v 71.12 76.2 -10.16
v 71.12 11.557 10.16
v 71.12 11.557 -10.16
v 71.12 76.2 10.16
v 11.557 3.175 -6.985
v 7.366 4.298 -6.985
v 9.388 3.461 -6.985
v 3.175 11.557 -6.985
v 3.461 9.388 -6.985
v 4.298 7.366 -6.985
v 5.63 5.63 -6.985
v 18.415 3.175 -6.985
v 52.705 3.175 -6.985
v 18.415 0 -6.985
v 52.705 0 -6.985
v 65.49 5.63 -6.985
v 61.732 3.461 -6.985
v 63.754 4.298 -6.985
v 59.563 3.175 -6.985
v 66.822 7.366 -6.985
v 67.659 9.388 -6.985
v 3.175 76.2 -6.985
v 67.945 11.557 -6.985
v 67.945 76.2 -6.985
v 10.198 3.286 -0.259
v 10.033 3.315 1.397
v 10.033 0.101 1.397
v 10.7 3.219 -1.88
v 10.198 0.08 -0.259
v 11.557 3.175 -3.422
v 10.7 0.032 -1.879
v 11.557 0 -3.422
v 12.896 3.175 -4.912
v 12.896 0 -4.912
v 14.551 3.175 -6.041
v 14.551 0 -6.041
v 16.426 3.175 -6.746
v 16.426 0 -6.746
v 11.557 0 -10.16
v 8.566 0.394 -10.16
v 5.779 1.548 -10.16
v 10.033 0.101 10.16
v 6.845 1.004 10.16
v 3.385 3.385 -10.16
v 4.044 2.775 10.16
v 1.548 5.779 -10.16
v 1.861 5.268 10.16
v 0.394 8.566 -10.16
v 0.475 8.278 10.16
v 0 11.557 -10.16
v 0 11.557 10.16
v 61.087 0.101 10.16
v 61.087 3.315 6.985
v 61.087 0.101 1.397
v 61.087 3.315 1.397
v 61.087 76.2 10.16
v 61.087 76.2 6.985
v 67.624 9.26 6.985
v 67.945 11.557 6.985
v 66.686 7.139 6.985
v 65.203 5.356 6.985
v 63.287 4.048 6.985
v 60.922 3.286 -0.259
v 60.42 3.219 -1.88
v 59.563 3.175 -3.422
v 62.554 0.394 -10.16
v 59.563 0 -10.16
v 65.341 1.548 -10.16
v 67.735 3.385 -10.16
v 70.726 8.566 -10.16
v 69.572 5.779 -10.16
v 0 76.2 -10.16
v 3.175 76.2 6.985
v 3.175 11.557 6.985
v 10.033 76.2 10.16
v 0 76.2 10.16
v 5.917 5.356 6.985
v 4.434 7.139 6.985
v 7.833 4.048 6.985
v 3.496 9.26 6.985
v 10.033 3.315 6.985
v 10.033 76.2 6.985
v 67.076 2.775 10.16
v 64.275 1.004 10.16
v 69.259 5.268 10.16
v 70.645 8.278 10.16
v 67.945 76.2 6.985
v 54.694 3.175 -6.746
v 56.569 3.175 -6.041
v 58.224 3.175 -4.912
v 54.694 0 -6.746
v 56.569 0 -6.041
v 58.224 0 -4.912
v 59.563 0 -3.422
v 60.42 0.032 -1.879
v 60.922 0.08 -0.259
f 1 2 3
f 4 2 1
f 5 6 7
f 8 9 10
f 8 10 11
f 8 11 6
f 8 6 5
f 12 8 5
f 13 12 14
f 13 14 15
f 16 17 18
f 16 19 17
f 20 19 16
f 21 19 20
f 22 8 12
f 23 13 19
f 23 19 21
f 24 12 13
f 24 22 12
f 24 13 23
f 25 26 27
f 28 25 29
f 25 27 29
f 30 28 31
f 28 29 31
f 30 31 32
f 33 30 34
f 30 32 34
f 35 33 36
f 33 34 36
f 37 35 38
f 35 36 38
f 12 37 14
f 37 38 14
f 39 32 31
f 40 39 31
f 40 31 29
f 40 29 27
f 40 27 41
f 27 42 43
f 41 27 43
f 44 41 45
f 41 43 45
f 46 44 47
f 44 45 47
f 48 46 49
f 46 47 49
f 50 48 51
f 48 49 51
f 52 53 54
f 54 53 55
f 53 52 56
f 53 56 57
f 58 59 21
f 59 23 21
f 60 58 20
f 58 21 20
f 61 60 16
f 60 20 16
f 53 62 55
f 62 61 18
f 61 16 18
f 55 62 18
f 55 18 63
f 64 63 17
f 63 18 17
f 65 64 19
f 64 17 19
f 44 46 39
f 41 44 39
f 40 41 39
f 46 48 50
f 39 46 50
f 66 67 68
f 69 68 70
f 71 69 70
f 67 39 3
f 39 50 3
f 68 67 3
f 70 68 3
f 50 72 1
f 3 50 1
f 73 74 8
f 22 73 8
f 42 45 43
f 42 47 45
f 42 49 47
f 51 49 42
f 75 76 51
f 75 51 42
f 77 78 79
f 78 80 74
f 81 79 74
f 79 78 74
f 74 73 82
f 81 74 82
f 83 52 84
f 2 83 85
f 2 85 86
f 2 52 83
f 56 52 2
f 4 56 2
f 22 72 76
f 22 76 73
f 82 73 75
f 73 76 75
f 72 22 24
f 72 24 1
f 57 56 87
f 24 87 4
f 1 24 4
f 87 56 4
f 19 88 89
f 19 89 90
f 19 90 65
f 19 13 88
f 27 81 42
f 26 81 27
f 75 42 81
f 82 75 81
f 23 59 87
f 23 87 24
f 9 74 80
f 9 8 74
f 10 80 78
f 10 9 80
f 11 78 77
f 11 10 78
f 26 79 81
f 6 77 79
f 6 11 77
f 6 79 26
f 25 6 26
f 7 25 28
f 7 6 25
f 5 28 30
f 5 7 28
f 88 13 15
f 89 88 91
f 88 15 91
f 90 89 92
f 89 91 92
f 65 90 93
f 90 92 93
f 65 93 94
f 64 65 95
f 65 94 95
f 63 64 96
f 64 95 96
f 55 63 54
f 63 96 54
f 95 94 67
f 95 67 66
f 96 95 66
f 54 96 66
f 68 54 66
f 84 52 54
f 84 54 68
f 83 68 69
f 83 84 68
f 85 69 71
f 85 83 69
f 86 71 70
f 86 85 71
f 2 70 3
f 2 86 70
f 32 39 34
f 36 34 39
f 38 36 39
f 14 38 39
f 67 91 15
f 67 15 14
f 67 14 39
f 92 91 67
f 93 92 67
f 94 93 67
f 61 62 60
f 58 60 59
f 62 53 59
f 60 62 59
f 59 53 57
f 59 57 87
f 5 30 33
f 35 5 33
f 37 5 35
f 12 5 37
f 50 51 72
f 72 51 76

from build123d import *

# Parameters (mm, degrees)
SKETCH1_W           = 71.12
SKETCH1_H           = 76.2
BOSS_EXTRUDE1_DEPTH = 10.16
SKETCH2_W           = 64.77
SKETCH2_H           = 13.97
CUT_EXTRUDE1_DEPTH  = 73.025
SKETCH10_W          = 51.054
SKETCH10_H          = 17.145
CUT_EXTRUDE2_DEPTH  = 77.2
FILLET5_R           = 8.382
FILLET3_R           = 8.382
CUT_EXTRUDE3_DEPTH  = 21.32


with BuildPart() as part:
    # Sketch1 → Boss-Extrude1 (new body, symmetric)
    with BuildSketch(Plane.XY):
        with Locations((35.56, 38.1)):
            Rectangle(SKETCH1_W, SKETCH1_H)
    extrude(amount=BOSS_EXTRUDE1_DEPTH, both=True)

    # Sketch2 → Cut-Extrude1 (cut)
    with BuildSketch(Plane(origin=(0, 76.2, 0), x_dir=(1, 0, 0), z_dir=(0, 1, 0))):
        with Locations((35.56, 0)):
            Rectangle(SKETCH2_W, SKETCH2_H)
    extrude(amount=-CUT_EXTRUDE1_DEPTH, mode=Mode.SUBTRACT)

    # Sketch10 → Cut-Extrude2 (cut, through all)
    with BuildSketch(Plane(origin=(0, 76.2, 0), x_dir=(1, 0, 0), z_dir=(0, 1, 0))):
        with Locations((35.56, -1.5875)):
            Rectangle(SKETCH10_W, SKETCH10_H)
    extrude(amount=-CUT_EXTRUDE2_DEPTH, mode=Mode.SUBTRACT)

    # Fillet5
    fillet5_edges = [part.edges().sort_by_distance(p)[0] for p in [
        (61.087, 1.5875, -6.985),
        (10.033, 1.5875, -6.985),
    ]]
    fillet(fillet5_edges, radius=FILLET5_R)

    # Fillet3
    fillet3_edges = [part.edges().sort_by_distance(p)[0] for p in [
        (67.945, 3.175, 0),
        (3.175, 3.175, 0),
    ]]
    fillet(fillet3_edges, radius=FILLET3_R)

    # Sketch11 → Cut-Extrude3 (cut, through all)
    with BuildSketch(Plane.XY.offset(10.16)):
        with BuildLine():
            Line((0, 11.557), (0, 0))
            Line((0, 0), (11.557, 0))
            ThreePointArc((11.557, 0), (3.38496693, 3.38496693), (0, 11.557))
        make_face()
        with BuildLine():
            Line((71.12, 11.557), (71.12, 0))
            Line((71.12, 0), (59.563, 0))
            ThreePointArc((59.563, 0), (67.73503307, 3.38496693), (71.12, 11.557))
        make_face()
    extrude(amount=-CUT_EXTRUDE3_DEPTH, mode=Mode.SUBTRACT)


solid = part.part
